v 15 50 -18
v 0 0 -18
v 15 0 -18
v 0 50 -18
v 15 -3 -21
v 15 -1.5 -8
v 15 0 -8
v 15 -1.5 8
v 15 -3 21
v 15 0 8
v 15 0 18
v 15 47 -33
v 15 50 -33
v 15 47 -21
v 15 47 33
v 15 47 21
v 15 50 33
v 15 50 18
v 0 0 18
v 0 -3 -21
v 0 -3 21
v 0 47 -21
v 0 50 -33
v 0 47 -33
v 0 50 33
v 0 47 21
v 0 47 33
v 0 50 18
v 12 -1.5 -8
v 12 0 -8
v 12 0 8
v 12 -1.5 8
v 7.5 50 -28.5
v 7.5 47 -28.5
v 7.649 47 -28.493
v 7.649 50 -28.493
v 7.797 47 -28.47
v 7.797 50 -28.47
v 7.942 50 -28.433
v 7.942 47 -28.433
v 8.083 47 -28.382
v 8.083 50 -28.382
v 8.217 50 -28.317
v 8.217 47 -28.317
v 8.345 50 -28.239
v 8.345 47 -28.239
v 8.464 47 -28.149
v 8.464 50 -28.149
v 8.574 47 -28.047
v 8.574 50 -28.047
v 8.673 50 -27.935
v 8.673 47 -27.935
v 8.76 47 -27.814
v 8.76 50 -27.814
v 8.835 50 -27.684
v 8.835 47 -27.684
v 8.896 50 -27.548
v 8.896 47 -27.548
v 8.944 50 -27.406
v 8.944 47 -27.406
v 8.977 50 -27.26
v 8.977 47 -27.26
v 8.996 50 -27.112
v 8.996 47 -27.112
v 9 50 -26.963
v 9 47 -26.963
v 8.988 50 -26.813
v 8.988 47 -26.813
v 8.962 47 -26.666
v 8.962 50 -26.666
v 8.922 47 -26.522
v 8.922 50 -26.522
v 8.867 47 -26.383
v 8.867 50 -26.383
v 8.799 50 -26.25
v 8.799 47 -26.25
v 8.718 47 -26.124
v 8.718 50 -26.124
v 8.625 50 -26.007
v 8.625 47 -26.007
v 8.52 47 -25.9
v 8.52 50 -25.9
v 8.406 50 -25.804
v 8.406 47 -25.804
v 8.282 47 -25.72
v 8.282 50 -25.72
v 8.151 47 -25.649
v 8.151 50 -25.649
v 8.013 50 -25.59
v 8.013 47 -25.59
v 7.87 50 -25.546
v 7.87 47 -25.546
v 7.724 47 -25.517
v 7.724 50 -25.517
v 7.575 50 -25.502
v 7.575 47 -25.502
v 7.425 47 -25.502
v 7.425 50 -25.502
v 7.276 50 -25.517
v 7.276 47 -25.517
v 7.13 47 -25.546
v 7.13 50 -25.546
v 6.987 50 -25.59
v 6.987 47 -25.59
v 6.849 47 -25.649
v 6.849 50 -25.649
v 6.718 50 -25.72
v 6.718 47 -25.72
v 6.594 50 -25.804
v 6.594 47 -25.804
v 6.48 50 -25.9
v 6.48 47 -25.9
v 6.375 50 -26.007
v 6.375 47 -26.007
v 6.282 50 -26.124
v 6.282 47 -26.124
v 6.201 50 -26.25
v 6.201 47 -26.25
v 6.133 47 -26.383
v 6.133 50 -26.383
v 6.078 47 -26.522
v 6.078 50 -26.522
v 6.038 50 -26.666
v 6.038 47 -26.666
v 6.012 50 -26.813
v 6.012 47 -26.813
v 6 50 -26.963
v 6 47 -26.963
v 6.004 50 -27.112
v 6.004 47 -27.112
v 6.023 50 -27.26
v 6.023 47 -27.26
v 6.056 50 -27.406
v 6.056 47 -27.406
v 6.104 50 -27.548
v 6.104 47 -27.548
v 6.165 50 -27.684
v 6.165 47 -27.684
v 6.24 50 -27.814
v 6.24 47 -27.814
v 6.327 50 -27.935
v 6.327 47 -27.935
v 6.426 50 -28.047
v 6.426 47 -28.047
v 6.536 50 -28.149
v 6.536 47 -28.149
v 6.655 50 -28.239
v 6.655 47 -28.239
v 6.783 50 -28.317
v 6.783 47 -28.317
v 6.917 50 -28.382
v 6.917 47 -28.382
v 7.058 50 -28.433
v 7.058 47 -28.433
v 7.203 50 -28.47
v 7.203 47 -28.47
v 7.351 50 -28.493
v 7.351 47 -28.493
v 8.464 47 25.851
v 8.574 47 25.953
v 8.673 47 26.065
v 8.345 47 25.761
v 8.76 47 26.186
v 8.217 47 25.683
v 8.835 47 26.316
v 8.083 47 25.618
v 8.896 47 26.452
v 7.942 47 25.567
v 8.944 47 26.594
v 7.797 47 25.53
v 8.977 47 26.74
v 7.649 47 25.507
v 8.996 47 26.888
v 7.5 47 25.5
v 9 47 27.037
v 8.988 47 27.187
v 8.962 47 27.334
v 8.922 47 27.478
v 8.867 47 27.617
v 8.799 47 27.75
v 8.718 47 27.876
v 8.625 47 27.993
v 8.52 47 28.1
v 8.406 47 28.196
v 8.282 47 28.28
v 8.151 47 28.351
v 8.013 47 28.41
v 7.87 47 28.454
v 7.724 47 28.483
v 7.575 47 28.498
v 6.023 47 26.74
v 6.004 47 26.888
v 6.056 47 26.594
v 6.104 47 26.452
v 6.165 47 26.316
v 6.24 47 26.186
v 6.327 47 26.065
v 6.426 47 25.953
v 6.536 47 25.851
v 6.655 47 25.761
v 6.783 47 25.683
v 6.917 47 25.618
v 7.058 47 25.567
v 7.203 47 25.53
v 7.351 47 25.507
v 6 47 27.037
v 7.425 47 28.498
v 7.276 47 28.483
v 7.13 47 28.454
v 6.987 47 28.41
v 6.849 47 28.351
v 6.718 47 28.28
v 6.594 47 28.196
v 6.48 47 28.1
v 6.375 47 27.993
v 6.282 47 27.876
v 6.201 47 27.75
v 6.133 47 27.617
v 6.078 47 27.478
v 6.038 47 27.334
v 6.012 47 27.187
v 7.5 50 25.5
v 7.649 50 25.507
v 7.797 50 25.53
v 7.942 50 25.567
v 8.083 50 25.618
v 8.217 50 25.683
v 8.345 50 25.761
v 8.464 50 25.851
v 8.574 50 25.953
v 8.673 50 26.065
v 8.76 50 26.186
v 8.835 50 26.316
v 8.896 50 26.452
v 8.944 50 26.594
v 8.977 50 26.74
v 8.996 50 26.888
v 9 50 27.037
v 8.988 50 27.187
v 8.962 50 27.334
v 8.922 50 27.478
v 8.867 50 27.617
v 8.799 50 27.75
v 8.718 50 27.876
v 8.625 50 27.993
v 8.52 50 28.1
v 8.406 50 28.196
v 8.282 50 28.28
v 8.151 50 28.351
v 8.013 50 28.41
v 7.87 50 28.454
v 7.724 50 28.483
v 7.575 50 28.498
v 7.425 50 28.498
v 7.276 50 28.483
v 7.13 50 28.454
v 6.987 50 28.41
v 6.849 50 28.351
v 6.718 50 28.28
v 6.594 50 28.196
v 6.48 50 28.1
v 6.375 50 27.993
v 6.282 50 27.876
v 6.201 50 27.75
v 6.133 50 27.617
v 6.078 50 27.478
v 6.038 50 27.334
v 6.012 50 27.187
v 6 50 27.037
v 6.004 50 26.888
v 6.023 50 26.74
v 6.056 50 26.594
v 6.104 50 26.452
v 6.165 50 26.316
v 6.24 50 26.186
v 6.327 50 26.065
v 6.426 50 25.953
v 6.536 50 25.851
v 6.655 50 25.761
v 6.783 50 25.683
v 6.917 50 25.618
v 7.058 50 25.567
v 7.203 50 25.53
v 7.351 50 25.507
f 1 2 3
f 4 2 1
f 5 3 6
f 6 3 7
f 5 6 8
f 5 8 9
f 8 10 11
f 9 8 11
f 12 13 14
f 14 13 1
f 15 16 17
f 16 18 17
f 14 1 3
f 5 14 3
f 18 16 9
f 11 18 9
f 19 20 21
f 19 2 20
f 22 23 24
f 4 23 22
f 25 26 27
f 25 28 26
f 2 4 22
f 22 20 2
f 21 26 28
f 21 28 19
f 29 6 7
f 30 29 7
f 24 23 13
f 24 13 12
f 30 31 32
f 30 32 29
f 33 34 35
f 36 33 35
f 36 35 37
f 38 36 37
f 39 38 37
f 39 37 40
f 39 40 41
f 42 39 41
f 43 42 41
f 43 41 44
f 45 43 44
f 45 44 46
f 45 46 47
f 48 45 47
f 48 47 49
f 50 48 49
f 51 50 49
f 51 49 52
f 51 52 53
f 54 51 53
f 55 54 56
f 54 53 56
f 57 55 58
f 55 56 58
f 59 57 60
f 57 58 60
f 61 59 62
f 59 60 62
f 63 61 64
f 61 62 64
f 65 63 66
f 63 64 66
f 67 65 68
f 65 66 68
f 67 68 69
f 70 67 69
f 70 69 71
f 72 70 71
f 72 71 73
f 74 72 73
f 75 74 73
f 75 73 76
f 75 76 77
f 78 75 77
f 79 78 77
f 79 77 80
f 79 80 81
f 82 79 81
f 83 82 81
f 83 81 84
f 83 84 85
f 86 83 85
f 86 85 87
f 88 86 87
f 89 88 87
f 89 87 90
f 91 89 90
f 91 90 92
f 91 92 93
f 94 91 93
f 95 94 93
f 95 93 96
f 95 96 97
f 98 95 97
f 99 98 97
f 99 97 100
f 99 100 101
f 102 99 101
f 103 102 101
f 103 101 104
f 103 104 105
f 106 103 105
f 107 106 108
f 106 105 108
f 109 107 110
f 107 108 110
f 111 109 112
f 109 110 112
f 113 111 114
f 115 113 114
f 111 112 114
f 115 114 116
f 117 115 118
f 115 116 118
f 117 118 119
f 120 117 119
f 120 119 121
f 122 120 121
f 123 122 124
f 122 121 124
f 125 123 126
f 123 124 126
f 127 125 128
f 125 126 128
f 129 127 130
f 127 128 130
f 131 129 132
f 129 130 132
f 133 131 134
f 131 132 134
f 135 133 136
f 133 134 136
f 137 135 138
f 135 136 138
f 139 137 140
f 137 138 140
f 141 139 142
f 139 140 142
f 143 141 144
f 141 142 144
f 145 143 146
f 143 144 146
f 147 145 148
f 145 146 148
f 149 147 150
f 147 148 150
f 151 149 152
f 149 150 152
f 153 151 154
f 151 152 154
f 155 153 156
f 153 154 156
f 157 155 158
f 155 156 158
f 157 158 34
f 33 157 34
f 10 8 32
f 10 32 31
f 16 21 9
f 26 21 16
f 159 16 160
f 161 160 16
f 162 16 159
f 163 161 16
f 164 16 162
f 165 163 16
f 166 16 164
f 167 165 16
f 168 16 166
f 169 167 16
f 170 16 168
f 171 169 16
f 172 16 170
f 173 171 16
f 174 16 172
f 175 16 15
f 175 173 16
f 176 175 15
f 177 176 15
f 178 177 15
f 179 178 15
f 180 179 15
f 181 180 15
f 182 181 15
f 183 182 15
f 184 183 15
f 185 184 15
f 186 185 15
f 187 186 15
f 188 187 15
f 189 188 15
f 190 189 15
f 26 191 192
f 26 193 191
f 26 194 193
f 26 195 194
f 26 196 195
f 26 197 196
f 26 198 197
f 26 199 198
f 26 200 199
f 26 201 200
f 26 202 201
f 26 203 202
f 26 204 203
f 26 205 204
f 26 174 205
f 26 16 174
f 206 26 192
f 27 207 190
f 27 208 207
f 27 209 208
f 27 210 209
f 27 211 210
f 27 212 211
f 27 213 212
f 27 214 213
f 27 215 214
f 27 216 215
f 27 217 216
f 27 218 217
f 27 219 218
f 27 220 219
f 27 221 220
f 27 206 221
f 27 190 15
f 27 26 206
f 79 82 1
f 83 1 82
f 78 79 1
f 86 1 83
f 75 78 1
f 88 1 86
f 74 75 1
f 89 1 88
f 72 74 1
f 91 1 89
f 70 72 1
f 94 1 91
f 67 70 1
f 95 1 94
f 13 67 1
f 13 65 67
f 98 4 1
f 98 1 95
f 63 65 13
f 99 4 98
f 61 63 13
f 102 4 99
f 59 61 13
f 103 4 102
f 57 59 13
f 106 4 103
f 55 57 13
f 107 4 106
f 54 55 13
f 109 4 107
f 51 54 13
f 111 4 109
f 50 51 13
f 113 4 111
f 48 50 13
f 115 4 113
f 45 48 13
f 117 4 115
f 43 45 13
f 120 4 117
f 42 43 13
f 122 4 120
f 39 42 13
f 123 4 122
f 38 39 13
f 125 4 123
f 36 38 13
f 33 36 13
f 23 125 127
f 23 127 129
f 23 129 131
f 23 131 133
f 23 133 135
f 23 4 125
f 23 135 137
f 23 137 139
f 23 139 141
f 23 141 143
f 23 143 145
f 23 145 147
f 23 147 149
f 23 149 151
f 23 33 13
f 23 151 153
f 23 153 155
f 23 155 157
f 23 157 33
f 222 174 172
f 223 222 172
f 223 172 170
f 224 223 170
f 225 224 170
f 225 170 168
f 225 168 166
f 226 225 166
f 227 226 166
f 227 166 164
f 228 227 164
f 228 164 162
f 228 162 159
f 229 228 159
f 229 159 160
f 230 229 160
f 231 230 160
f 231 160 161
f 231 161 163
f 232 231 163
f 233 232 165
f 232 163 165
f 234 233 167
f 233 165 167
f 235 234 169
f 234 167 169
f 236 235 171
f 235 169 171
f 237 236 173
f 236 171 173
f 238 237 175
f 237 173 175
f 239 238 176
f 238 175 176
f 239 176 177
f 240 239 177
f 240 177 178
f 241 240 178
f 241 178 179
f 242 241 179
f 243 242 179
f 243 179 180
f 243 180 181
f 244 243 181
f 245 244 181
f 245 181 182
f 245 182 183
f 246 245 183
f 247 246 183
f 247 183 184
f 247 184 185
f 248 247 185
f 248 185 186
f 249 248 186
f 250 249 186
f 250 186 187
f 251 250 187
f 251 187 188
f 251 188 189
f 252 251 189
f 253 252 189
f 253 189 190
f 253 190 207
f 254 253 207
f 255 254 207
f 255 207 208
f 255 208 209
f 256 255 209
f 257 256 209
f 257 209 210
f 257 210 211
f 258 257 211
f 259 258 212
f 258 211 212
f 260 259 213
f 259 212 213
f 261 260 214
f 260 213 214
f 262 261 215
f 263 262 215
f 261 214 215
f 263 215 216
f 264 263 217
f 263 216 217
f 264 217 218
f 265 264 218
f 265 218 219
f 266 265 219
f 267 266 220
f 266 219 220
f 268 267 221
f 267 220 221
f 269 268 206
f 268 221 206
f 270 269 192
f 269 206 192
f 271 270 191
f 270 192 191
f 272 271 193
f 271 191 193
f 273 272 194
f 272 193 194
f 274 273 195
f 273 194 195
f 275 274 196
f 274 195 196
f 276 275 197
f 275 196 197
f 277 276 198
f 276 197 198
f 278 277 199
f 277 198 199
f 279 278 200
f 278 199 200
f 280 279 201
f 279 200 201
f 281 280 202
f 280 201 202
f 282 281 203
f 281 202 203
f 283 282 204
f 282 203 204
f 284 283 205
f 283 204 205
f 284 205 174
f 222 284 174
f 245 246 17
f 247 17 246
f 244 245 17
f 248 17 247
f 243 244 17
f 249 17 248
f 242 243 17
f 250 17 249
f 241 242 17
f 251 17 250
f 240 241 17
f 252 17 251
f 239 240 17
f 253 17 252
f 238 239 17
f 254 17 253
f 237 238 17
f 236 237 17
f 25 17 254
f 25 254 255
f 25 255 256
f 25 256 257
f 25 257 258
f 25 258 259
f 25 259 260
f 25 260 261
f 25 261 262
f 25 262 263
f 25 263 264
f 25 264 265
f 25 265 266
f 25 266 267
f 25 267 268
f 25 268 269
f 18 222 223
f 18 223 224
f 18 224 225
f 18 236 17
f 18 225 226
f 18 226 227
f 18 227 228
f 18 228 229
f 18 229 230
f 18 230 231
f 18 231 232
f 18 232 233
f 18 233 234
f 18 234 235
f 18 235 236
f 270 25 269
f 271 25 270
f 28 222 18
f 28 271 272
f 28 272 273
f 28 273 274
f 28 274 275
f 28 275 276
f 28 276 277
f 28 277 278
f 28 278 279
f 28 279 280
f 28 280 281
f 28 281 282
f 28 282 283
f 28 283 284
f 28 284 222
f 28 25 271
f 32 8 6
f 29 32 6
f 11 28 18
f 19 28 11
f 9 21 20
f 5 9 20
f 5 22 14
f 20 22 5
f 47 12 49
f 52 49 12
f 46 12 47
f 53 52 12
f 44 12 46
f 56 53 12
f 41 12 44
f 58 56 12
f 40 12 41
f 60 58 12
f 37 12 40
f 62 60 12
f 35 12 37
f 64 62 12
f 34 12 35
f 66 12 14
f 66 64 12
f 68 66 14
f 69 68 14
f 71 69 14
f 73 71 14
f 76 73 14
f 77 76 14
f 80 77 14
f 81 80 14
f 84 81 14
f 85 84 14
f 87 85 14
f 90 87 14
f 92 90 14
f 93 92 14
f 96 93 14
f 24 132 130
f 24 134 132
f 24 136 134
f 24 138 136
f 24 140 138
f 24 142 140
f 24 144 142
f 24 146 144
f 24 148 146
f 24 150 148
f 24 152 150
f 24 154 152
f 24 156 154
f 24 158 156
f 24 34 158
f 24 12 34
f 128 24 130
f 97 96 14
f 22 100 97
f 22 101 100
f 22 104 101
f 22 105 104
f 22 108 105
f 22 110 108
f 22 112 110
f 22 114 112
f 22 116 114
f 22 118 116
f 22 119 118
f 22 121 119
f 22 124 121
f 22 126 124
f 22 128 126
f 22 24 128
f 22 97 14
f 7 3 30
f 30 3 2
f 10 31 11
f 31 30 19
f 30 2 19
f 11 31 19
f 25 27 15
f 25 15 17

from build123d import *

# Parameters (mm, degrees)
EXTRUDE_1_DEPTH     = 15
CUT_EXTRUDE_1_REACH = 63.758
SKETCH_2_R          = 1.5
SKETCH_3_W          = 16
SKETCH_3_H          = 1.5
CUT_EXTRUDE_2_DEPTH = 3


with BuildPart() as part:
    # 草图1 → 凸台-拉伸1 (new body)
    with BuildSketch(Plane(origin=(0, 0, 0), x_dir=(0, 0, -1), z_dir=(1, 0, 0))):
        Polygon((0, 0), (18, 0), (18, 50), (33, 50), (33, 47), (21, 47), (21, -3), (0, -3), (-21, -3), (-21, 47), (-33, 47), (-33, 50), (-18, 50), (-18, 0), align=None)
    extrude(amount=EXTRUDE_1_DEPTH)

    # 草图2 → 切除-拉伸1 (cut, up to next)
    with BuildSketch(Plane.XZ.offset(-47), mode=Mode.PRIVATE) as cut_extrude_1_sk1:
        with Locations(Location((7.5, -27, 0), (0, 0, 270))):
            Circle(SKETCH_2_R)
    cut_extrude_1_tool1 = extrude(cut_extrude_1_sk1.sketch, amount=-CUT_EXTRUDE_1_REACH, mode=Mode.PRIVATE) & part.part
    # 草图2 → 切除-拉伸1 (cut, up to next)
    with BuildSketch(Plane.XZ.offset(-47), mode=Mode.PRIVATE) as cut_extrude_1_sk2:
        with Locations(Location((7.5, 27, 0), (0, 0, 270))):
            Circle(SKETCH_2_R)
    cut_extrude_1_tool2 = extrude(cut_extrude_1_sk2.sketch, amount=-CUT_EXTRUDE_1_REACH, mode=Mode.PRIVATE) & part.part
    add(cut_extrude_1_tool1.solids().sort_by_distance((7.5, 47, -27))[0], mode=Mode.SUBTRACT)
    add(cut_extrude_1_tool2.solids().sort_by_distance((7.5, 47, 27))[0], mode=Mode.SUBTRACT)

    # 草图3 → 切除-拉伸2 (cut)
    with BuildSketch(Plane(origin=(15, 0, 0), x_dir=(0, 0, -1), z_dir=(1, 0, 0))):
        with Locations((0, -0.75)):
            Rectangle(SKETCH_3_W, SKETCH_3_H)
    extrude(amount=-CUT_EXTRUDE_2_DEPTH, mode=Mode.SUBTRACT)


solid = part.part
